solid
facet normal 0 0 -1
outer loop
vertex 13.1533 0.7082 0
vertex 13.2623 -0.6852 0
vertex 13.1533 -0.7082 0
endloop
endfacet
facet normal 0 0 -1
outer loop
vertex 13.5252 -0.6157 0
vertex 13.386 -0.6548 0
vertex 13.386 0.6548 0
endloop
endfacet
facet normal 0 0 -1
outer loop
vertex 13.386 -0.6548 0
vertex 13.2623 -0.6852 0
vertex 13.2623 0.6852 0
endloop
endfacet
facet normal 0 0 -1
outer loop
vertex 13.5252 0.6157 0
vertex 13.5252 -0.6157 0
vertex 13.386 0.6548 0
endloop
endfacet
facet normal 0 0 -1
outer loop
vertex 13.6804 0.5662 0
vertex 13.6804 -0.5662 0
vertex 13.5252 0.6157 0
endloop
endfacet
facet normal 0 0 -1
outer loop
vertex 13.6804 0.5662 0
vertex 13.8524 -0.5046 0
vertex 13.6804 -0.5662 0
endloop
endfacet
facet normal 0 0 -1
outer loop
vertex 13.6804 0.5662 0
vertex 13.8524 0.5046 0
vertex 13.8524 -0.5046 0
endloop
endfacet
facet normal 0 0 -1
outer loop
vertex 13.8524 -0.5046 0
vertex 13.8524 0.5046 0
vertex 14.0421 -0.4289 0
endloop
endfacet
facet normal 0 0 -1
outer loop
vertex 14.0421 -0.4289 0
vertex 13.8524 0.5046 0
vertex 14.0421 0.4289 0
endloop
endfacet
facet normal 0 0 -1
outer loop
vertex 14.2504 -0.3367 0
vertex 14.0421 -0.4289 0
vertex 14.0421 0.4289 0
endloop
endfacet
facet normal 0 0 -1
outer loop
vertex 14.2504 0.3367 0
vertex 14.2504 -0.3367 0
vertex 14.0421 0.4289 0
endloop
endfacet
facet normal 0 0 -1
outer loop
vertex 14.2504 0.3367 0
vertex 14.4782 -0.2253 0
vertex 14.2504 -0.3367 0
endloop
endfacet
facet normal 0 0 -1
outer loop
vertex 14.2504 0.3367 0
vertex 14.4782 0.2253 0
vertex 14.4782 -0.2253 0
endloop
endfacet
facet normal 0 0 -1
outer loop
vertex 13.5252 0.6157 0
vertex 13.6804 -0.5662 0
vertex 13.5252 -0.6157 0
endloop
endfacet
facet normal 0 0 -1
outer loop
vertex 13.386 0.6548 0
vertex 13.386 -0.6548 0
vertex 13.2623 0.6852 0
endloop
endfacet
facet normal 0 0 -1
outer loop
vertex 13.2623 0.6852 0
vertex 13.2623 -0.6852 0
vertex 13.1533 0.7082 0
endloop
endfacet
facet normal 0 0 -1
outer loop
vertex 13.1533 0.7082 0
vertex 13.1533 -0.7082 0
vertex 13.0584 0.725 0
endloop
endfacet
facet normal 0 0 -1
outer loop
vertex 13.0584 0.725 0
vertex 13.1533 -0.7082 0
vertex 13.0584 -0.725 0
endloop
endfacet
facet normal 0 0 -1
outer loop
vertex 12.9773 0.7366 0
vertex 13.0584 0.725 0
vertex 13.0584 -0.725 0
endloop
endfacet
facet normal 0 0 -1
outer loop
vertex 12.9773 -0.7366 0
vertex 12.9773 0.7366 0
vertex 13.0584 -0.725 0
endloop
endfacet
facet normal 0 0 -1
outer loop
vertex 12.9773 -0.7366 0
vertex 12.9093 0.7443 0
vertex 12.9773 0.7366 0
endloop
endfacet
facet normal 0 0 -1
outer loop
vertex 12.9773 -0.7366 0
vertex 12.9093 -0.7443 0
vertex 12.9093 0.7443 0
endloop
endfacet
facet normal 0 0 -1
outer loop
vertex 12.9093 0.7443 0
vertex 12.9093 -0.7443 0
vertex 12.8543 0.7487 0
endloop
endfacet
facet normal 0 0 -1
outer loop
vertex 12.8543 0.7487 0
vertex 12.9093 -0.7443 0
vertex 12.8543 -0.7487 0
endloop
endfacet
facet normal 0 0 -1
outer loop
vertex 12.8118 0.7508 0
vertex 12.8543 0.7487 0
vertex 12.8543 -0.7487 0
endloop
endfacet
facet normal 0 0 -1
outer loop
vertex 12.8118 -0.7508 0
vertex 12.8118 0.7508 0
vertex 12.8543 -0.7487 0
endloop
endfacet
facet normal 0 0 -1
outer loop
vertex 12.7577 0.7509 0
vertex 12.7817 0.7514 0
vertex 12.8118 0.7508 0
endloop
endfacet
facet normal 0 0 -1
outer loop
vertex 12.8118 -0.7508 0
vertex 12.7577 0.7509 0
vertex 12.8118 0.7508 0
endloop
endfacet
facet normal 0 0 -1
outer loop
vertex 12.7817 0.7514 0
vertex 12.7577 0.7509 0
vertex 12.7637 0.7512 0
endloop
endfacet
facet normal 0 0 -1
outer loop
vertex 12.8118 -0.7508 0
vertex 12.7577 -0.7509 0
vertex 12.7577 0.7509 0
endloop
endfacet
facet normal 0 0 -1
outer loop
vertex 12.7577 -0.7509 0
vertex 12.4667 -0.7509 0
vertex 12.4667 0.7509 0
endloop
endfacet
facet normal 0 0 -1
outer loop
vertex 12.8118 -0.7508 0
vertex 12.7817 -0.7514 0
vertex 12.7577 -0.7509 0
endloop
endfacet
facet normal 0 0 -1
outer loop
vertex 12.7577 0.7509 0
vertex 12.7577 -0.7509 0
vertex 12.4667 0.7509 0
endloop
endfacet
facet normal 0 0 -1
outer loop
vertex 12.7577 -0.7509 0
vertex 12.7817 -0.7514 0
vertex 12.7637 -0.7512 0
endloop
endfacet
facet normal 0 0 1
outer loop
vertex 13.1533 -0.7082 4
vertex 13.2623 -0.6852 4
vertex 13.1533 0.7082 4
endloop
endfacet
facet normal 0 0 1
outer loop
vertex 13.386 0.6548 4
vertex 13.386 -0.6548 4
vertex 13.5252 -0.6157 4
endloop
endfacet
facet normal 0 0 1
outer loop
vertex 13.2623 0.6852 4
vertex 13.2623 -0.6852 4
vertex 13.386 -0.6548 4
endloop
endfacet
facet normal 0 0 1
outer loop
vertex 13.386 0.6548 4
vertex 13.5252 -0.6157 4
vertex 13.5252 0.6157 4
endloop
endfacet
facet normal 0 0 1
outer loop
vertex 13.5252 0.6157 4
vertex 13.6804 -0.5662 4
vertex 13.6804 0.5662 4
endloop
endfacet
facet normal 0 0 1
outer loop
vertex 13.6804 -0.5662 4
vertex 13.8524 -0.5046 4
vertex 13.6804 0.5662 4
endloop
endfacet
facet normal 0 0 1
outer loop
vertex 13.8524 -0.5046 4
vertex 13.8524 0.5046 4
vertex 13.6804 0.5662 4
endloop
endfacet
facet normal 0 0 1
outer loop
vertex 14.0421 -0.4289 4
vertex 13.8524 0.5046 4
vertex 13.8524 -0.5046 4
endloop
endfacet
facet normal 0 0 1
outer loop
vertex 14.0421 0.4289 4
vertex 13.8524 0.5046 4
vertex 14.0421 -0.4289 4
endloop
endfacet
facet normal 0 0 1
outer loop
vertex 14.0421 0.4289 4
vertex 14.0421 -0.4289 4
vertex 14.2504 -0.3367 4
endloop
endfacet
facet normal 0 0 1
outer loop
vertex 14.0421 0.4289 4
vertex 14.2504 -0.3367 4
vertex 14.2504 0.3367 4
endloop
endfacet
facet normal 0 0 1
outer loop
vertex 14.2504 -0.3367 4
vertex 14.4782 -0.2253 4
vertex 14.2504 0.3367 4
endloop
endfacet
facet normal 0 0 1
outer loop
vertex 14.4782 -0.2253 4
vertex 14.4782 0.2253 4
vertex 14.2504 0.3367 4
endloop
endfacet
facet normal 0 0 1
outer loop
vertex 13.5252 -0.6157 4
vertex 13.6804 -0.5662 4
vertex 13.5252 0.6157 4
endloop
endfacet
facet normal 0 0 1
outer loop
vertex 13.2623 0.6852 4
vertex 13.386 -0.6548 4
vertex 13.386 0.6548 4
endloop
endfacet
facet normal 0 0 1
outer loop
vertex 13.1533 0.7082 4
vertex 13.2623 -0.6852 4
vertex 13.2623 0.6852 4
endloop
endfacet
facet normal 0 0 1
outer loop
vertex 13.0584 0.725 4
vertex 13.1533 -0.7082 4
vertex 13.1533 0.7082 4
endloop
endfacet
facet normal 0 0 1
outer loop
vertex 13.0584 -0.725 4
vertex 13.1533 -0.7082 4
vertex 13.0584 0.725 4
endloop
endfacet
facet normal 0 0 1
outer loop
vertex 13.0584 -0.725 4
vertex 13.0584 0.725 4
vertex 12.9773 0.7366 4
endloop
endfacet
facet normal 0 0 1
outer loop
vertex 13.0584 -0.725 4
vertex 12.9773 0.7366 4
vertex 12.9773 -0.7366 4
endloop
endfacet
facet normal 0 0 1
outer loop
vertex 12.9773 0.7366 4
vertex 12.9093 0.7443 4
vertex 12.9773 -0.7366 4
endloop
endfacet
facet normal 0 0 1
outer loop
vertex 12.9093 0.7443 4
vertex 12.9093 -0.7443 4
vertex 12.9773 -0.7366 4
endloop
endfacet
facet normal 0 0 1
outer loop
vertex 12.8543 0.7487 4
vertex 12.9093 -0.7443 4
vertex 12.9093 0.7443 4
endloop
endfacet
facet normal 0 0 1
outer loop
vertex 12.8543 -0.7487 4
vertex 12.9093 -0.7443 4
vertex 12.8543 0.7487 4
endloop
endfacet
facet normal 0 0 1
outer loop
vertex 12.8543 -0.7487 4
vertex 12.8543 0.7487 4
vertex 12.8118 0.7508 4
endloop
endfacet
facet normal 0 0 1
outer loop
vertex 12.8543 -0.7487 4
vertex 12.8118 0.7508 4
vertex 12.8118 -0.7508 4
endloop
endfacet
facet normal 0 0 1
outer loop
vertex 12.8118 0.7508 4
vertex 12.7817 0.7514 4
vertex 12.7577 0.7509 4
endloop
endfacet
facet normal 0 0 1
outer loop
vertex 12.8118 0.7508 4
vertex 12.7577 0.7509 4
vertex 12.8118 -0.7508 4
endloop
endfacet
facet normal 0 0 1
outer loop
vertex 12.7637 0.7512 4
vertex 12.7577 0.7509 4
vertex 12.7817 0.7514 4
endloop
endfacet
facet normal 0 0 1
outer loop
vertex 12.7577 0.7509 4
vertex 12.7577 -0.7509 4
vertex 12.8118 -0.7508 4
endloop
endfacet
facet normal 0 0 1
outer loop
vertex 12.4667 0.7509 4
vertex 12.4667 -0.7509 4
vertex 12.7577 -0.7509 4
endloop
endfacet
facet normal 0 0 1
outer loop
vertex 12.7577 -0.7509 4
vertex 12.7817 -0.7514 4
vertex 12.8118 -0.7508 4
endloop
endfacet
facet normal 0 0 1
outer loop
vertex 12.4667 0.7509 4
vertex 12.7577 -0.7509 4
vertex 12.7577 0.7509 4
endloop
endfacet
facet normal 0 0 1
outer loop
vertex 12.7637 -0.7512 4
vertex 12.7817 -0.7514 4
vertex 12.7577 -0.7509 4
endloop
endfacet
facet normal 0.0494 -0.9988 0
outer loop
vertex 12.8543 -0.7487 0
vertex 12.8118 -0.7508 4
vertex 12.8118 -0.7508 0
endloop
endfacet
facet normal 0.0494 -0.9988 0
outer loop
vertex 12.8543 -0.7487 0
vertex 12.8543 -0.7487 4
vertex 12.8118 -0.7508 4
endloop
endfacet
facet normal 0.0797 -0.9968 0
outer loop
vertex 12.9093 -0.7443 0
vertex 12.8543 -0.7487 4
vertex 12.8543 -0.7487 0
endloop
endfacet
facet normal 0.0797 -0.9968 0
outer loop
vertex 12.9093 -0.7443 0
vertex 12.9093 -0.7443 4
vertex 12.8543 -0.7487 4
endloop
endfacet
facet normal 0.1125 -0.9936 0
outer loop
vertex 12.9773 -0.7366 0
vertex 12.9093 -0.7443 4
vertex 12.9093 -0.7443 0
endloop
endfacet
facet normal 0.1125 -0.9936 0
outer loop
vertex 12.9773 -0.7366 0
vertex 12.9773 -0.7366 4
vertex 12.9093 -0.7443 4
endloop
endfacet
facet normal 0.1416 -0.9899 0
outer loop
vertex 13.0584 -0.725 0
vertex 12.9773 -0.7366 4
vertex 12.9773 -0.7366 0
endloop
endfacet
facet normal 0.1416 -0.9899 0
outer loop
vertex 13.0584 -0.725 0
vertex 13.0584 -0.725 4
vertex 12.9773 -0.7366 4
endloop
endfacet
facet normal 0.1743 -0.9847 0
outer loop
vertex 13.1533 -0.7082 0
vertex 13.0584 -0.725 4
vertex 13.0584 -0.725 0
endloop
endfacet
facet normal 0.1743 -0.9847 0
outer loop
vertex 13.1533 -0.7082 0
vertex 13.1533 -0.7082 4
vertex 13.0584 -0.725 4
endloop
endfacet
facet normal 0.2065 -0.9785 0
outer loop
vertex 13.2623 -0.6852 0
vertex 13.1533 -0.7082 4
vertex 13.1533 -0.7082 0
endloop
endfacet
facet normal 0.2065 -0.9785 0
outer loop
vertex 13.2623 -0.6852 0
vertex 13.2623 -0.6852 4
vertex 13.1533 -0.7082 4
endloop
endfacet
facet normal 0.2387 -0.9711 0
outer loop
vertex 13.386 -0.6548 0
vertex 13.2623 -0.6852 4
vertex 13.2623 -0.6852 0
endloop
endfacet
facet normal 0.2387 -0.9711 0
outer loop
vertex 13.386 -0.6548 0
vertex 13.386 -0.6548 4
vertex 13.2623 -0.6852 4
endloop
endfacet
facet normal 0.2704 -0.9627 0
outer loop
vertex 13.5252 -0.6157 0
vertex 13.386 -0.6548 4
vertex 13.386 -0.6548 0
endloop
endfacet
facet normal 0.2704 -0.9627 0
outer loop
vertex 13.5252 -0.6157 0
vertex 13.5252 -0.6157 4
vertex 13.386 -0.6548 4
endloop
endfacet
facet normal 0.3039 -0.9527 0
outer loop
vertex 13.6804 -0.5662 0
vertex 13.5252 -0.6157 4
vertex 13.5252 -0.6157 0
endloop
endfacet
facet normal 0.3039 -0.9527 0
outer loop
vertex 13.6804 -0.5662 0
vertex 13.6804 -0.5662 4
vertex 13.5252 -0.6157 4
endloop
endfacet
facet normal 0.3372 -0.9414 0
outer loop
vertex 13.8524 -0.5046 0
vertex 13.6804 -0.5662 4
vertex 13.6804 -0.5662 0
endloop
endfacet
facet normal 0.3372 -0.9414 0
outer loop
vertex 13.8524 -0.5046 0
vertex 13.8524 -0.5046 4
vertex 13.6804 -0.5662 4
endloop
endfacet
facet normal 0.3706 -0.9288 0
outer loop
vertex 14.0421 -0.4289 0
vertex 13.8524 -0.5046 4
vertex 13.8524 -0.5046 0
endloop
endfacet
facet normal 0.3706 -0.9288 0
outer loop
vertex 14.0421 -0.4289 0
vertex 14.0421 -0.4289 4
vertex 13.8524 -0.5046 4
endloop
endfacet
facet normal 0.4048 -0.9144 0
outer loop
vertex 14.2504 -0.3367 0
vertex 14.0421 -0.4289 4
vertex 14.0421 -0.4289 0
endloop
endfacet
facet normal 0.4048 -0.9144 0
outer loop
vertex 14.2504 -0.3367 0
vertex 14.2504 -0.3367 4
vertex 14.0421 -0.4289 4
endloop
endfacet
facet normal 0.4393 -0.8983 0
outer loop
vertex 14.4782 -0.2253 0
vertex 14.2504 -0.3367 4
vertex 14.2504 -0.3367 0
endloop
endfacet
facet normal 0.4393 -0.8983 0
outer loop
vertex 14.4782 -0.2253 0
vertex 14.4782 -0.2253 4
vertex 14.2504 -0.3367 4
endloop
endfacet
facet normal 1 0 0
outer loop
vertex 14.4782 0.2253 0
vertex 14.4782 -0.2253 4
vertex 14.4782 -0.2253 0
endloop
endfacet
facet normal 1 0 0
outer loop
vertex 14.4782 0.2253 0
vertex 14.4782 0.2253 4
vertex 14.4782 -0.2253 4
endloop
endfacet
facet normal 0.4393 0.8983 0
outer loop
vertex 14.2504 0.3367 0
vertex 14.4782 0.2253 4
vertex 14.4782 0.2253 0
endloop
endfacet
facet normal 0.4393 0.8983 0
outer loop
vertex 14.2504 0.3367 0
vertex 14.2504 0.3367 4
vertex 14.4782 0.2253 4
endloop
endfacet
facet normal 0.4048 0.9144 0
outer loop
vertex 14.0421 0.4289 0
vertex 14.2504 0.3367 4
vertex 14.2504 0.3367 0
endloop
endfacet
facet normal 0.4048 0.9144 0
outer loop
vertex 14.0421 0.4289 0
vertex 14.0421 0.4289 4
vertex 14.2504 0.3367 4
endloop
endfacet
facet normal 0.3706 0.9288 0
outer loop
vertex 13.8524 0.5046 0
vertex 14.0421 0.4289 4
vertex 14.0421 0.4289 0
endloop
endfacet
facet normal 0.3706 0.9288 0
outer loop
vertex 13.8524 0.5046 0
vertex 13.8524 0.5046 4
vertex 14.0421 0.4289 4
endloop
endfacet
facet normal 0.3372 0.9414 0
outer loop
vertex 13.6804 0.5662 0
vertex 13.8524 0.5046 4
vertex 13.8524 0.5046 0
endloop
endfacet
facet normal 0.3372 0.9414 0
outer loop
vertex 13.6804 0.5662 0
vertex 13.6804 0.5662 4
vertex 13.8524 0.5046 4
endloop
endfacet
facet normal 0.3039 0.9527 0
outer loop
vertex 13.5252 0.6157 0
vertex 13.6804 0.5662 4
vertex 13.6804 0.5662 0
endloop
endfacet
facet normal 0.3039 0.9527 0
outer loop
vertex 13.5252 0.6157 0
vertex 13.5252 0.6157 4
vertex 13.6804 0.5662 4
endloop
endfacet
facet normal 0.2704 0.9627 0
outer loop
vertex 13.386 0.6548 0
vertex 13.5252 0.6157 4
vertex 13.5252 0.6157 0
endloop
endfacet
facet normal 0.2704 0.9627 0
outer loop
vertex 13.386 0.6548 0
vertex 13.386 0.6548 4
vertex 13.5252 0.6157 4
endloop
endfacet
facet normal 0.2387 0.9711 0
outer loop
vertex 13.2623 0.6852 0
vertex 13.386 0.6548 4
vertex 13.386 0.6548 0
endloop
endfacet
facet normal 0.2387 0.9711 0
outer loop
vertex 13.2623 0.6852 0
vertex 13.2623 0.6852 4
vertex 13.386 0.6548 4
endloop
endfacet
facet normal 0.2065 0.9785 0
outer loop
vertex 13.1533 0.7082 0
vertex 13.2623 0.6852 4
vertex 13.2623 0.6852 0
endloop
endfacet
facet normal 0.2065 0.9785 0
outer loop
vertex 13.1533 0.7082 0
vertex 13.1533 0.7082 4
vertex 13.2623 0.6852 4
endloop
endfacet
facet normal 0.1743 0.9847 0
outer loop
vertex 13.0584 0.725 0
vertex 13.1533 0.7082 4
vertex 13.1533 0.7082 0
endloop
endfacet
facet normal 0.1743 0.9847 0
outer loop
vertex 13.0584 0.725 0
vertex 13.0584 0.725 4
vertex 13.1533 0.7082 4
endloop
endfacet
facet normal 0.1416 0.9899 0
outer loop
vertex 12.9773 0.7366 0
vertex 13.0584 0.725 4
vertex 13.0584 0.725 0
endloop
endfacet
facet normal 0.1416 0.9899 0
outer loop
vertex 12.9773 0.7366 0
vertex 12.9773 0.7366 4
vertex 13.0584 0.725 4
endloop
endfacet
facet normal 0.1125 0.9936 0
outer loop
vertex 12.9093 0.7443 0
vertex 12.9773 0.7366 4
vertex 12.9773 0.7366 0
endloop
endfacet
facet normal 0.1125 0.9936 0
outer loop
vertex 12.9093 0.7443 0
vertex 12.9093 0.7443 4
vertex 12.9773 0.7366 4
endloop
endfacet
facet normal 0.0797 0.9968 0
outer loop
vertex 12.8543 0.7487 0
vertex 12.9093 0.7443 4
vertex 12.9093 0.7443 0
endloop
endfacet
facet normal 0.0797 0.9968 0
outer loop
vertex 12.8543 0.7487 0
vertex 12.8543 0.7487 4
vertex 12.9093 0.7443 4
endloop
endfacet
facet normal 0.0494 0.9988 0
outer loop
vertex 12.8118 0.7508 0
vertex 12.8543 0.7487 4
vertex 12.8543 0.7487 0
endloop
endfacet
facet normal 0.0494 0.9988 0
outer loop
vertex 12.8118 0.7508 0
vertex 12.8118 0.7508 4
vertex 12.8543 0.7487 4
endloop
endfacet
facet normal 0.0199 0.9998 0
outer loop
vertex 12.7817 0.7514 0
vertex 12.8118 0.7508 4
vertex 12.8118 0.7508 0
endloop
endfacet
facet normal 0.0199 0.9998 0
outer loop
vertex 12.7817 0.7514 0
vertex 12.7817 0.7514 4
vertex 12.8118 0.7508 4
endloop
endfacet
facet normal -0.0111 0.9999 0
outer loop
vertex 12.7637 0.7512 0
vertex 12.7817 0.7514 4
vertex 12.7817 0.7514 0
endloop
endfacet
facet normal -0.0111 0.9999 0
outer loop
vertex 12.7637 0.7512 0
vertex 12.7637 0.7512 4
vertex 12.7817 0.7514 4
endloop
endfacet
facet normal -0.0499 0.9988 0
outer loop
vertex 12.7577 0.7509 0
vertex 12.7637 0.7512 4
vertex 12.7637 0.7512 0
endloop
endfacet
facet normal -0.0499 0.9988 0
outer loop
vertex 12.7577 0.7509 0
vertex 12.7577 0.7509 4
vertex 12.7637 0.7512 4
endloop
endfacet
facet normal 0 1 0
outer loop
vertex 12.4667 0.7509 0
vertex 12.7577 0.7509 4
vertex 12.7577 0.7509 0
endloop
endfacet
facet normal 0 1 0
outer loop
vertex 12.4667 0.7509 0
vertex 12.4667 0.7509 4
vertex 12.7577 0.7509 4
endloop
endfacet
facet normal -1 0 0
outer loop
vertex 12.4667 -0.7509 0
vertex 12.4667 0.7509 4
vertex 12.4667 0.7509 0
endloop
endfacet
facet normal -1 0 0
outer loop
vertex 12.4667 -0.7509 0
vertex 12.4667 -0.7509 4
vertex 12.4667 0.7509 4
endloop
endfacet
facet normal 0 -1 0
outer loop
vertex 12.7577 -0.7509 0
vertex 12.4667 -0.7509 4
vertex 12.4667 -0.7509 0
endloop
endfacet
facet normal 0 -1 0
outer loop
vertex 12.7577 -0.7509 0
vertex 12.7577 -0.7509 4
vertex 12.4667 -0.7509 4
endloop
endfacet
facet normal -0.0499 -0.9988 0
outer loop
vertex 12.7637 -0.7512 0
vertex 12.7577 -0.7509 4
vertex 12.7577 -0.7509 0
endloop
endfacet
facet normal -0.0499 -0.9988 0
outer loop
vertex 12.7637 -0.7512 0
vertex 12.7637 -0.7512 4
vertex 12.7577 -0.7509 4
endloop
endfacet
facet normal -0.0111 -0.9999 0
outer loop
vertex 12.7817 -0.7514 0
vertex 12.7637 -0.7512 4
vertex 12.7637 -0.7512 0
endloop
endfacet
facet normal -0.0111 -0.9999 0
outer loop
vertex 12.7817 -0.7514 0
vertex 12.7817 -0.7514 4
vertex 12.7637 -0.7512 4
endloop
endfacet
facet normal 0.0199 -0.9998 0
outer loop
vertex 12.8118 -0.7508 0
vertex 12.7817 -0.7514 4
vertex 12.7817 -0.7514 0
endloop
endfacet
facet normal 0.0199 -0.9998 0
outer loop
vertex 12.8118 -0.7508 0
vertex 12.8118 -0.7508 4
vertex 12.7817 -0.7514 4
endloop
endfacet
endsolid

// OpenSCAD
// file: ../../../src/common/common_params.scad
/***
 * @module Common Parameters
 * @brief Shared constants and tolerances used by the CurveGears implementation.
 *
 * Historical constants are retained for numerical compatibility.
 */
_cg_pi = 3.14159;
_cg_deg_per_rad = 57.29578;
_cg_tolerance = 1e-7;
_cg_default_fn = 50;
_cg_circle_pi = 3.141592653589793;

/**
 * @module _cg_assert_samples
 * @brief Validate a sampled-curve count while preserving the caller diagnostic.
 * @param samples {integer >= minimum} Requested sample count.
 * @param message {string} Caller-specific diagnostic message.
 * @param minimum {integer, default 120} Minimum supported sample count.
 */
module _cg_assert_samples(samples,message="samples must be an integer >= 120",minimum=120) {
    assert(samples >= minimum && floor(samples)==samples,message);
}
// file: ../../../src/common/common_math.scad
/***
 * @module Common Math
 * @brief Shared scalar, angle and vector helpers used by the geometry layers.
 *
 * These functions are internal implementation primitives and are not part of
 * the public family API.
 */
include <common_params.scad>

/*** @function _cg_degrees(angle)
 * @brief Convert radians to degrees.
 * @param angle {number} Angle in radians.
 * @return {number} Angle in degrees.
 */
function _cg_degrees(angle) = angle*_cg_deg_per_rad;
/*** @function _cg_radians(angle)
 * @brief Convert degrees to radians.
 * @param angle {number} Angle in degrees.
 * @return {number} Angle in radians.
 */
function _cg_radians(angle) = angle/_cg_deg_per_rad;
/*** @function _cg_polar(p)
 * @brief Convert a polar `[radius, angle]` pair to Cartesian coordinates.
 * @param p {array} Polar pair with angle in degrees.
 * @return {array} Cartesian point `[x, y]`.
 */
function _cg_polar(p) = [p[0]*cos(p[1]),p[0]*sin(p[1])];

/*** @function _cg_vsub(a, b)
 * @brief Subtract one two-dimensional vector from another.
 * @param a {array} Left-hand vector.
 * @param b {array} Right-hand vector.
 * @return {array} Difference vector.
 */
function _cg_vsub(a,b) = [a[0]-b[0], a[1]-b[1]];
/*** @function _cg_vlen(a)
 * @brief Calculate the Euclidean length of a two-dimensional vector.
 * @param a {array} Vector.
 * @return {number} Vector length.
 */
function _cg_vlen(a) = sqrt(a[0]*a[0] + a[1]*a[1]);
/*** @function _cg_vunit(a)
 * @brief Normalise a two-dimensional vector, returning zero for a zero vector.
 * @param a {array} Vector.
 * @return {array} Unit vector or `[0, 0]`.
 */
function _cg_vunit(a) = let(l=_cg_vlen(a)) l == 0 ? [0,0] : [a[0]/l,a[1]/l];
/*** @function _cg_lerp(a, b, t)
 * @brief Linearly interpolate between two scalar values.
 * @param a {number} Start value.
 * @param b {number} End value.
 * @param t {number} Interpolation fraction.
 * @return {number} Interpolated value.
 */
function _cg_lerp(a,b,t) = a + t*(b-a);
/*** @function _cg_vlerp(a, b, t)
 * @brief Linearly interpolate between two two-dimensional vectors.
 * @param a {array} Start vector.
 * @param b {array} End vector.
 * @param t {number} Interpolation fraction.
 * @return {array} Interpolated vector.
 */
function _cg_vlerp(a,b,t) = [_cg_lerp(a[0],b[0],t), _cg_lerp(a[1],b[1],t)];
/*** @function _cg_cross2(a, b)
 * @brief Calculate the scalar two-dimensional cross product.
 * @param a {array} First vector.
 * @param b {array} Second vector.
 * @return {number} Signed cross-product magnitude.
 */
function _cg_cross2(a,b) = a[0]*b[1]-a[1]*b[0];
/*** @function _cg_sum(v, i, acc)
 * @brief Sum a scalar array recursively.
 * @param v {array} Scalar values.
 * @param i {integer, default 0} Current index.
 * @param acc {number, default 0} Accumulated sum.
 * @return {number} Sum of the values.
 */
function _cg_sum(v,i=0,acc=0) = i >= len(v) ? acc : _cg_sum(v,i+1,acc+v[i]);
/*** @function _cg_prefix_sums(v, i, acc, out)
 * @brief Build inclusive prefix sums for a scalar array.
 * @param v {array} Scalar values.
 * @param i {integer, default 0} Current index.
 * @param acc {number, default 0} Accumulated sum.
 * @param out {array, default [0]} Prefix-sum output under construction.
 * @return {array} Prefix sums beginning with zero.
 */
function _cg_prefix_sums(v,i=0,acc=0,out=[0]) =
    i >= len(v) ? out : _cg_prefix_sums(v,i+1,acc+v[i],concat(out,[acc+v[i]]));

/*** @function _cg_closed_polyline_perimeter(points)
 * @brief Calculate the perimeter of a closed sampled point list.
 * @param points {array of points} Closed Cartesian polyline.
 * @return {number} Perimeter in the input coordinate units.
 */
function _cg_closed_polyline_perimeter(points) =
    _cg_sum([for(i=[0:len(points)-1])
        _cg_vlen(_cg_vsub(points[(i+1)%len(points)],points[i]))]);

/*** @function _cg_pitch_scale_from_points(modul, tooth_number, unit_points, circumference)
 * @brief Calculate pitch scaling from an existing unit-curve sample.
 * @param modul {number > 0} Tooth module in mm.
 * @param tooth_number {integer >= 3} Requested tooth count.
 * @param unit_points {array of points} Closed unit-curve sample.
 * @param circumference {number > 0, default _cg_pi} Family-selected circumference constant.
 * @return {number} Scale factor for the sampled unit curve.
 */
function _cg_pitch_scale_from_points(modul,tooth_number,unit_points,circumference=_cg_pi) =
    circumference*modul*tooth_number/_cg_closed_polyline_perimeter(unit_points);

/*** @function _cg_scale_points(scale, points)
 * @brief Multiply every sampled point by one scalar.
 * @param scale {number} Point scale factor.
 * @param points {array of points} Cartesian point list.
 * @return {array of points} Scaled Cartesian point list.
 */
function _cg_scale_points(scale,points) = [for(p=points) [scale*p[0],scale*p[1]]];

function _cg_upper_bound_column(tab,target,column,lo,hi) =
    lo>=hi ? max(0,lo) :
    let(mid=floor((lo+hi+1)/2))
    tab[mid][column] <= target
        ? _cg_upper_bound_column(tab,target,column,mid,hi)
        : _cg_upper_bound_column(tab,target,column,lo,mid-1);

/*** @function _cg_interp_x_for_y(tab, target, i)
 * @brief Interpolate an x value at a monotonic y target in a two-column table.
 * @param tab {array} Table of `[x, y]` samples.
 * @param target {number} Target y value.
 * @param i {integer, default 0} Search index.
 * @return {number} Interpolated x value.
 */
function _cg_interp_x_for_y(tab,target,i=0) =
    target < tab[0][1] ? tab[len(tab)-1][0] :
    let(segment=min(len(tab)-2,max(0,_cg_upper_bound_column(tab,target,1,0,len(tab)-1))),
        y0=tab[segment][1],y1=tab[segment+1][1])
    y1>y0 ? _cg_lerp(tab[segment][0],tab[segment+1][0],(target-y0)/(y1-y0)) :
    tab[len(tab)-1][0];

/*** @function _cg_interp_y_for_x(tab, target, i)
 * @brief Interpolate a y value at a monotonic x target in a two-column table.
 * @param tab {array} Table of `[x, y]` samples.
 * @param target {number} Target x value.
 * @param i {integer, default 0} Search index.
 * @return {number} Interpolated y value.
 */
function _cg_interp_y_for_x(tab,target,i=0) =
    target < tab[0][0] ? tab[len(tab)-1][1] :
    let(segment=min(len(tab)-2,max(0,_cg_upper_bound_column(tab,target,0,0,len(tab)-1))),
        x0=tab[segment][0],x1=tab[segment+1][0])
    x1>x0 ? _cg_lerp(tab[segment][1],tab[segment+1][1],(target-x0)/(x1-x0)) :
    tab[len(tab)-1][1];
/***
 * @module Mathematical References
 * @brief Mathematical sources used by the CurveGears families.
 * The ellipse uses the standard parametric ellipse. The lobed family uses a
 * sinusoidally modulated polar radius. The Pascal family uses Pascal's
 * limaçon. The logarithmic spiral follows the standard logarithmic spiral.
 * The epitrochoid follows the rolling-circle construction. The superformula
 * follows Johan Gielis, “A generic geometric transformation that unifies a
 * wide range of natural and abstract shapes”, American Journal of Botany
 * 90(3), 333–338 (2003), DOI 10.3732/ajb.90.3.333.
 * References: https://doi.org/10.3732/ajb.90.3.333
 * Pascal limaçon: https://mathworld.wolfram.com/Limacon.html
 * Logarithmic spiral: https://mathworld.wolfram.com/LogarithmicSpiral.html
 * Epitrochoid: https://mathworld.wolfram.com/Epitrochoid.html
 */
// main file
/***
 * @function tooth_generation_include
 * @brief Direct include smoke test for the standalone tooth-generation layer.
 * Source: [`tooth/generation/include.scad`](tooth/generation/include.scad)
 */
include <../../../src/common/tooth/generation.scad>

$fn=48;
modul=.8;
tooth_number=34;
candidate=_cg_reference_tooth_candidate(modul*tooth_number/2,modul,tooth_number,20);
assert(candidate[0],str("standalone tooth generation failed: ",candidate[1]));
assert(len(candidate[8])>=6,"standalone tooth boundary is too short");
linear_extrude(height=4,convexity=4)
    polygon(candidate[8]);
